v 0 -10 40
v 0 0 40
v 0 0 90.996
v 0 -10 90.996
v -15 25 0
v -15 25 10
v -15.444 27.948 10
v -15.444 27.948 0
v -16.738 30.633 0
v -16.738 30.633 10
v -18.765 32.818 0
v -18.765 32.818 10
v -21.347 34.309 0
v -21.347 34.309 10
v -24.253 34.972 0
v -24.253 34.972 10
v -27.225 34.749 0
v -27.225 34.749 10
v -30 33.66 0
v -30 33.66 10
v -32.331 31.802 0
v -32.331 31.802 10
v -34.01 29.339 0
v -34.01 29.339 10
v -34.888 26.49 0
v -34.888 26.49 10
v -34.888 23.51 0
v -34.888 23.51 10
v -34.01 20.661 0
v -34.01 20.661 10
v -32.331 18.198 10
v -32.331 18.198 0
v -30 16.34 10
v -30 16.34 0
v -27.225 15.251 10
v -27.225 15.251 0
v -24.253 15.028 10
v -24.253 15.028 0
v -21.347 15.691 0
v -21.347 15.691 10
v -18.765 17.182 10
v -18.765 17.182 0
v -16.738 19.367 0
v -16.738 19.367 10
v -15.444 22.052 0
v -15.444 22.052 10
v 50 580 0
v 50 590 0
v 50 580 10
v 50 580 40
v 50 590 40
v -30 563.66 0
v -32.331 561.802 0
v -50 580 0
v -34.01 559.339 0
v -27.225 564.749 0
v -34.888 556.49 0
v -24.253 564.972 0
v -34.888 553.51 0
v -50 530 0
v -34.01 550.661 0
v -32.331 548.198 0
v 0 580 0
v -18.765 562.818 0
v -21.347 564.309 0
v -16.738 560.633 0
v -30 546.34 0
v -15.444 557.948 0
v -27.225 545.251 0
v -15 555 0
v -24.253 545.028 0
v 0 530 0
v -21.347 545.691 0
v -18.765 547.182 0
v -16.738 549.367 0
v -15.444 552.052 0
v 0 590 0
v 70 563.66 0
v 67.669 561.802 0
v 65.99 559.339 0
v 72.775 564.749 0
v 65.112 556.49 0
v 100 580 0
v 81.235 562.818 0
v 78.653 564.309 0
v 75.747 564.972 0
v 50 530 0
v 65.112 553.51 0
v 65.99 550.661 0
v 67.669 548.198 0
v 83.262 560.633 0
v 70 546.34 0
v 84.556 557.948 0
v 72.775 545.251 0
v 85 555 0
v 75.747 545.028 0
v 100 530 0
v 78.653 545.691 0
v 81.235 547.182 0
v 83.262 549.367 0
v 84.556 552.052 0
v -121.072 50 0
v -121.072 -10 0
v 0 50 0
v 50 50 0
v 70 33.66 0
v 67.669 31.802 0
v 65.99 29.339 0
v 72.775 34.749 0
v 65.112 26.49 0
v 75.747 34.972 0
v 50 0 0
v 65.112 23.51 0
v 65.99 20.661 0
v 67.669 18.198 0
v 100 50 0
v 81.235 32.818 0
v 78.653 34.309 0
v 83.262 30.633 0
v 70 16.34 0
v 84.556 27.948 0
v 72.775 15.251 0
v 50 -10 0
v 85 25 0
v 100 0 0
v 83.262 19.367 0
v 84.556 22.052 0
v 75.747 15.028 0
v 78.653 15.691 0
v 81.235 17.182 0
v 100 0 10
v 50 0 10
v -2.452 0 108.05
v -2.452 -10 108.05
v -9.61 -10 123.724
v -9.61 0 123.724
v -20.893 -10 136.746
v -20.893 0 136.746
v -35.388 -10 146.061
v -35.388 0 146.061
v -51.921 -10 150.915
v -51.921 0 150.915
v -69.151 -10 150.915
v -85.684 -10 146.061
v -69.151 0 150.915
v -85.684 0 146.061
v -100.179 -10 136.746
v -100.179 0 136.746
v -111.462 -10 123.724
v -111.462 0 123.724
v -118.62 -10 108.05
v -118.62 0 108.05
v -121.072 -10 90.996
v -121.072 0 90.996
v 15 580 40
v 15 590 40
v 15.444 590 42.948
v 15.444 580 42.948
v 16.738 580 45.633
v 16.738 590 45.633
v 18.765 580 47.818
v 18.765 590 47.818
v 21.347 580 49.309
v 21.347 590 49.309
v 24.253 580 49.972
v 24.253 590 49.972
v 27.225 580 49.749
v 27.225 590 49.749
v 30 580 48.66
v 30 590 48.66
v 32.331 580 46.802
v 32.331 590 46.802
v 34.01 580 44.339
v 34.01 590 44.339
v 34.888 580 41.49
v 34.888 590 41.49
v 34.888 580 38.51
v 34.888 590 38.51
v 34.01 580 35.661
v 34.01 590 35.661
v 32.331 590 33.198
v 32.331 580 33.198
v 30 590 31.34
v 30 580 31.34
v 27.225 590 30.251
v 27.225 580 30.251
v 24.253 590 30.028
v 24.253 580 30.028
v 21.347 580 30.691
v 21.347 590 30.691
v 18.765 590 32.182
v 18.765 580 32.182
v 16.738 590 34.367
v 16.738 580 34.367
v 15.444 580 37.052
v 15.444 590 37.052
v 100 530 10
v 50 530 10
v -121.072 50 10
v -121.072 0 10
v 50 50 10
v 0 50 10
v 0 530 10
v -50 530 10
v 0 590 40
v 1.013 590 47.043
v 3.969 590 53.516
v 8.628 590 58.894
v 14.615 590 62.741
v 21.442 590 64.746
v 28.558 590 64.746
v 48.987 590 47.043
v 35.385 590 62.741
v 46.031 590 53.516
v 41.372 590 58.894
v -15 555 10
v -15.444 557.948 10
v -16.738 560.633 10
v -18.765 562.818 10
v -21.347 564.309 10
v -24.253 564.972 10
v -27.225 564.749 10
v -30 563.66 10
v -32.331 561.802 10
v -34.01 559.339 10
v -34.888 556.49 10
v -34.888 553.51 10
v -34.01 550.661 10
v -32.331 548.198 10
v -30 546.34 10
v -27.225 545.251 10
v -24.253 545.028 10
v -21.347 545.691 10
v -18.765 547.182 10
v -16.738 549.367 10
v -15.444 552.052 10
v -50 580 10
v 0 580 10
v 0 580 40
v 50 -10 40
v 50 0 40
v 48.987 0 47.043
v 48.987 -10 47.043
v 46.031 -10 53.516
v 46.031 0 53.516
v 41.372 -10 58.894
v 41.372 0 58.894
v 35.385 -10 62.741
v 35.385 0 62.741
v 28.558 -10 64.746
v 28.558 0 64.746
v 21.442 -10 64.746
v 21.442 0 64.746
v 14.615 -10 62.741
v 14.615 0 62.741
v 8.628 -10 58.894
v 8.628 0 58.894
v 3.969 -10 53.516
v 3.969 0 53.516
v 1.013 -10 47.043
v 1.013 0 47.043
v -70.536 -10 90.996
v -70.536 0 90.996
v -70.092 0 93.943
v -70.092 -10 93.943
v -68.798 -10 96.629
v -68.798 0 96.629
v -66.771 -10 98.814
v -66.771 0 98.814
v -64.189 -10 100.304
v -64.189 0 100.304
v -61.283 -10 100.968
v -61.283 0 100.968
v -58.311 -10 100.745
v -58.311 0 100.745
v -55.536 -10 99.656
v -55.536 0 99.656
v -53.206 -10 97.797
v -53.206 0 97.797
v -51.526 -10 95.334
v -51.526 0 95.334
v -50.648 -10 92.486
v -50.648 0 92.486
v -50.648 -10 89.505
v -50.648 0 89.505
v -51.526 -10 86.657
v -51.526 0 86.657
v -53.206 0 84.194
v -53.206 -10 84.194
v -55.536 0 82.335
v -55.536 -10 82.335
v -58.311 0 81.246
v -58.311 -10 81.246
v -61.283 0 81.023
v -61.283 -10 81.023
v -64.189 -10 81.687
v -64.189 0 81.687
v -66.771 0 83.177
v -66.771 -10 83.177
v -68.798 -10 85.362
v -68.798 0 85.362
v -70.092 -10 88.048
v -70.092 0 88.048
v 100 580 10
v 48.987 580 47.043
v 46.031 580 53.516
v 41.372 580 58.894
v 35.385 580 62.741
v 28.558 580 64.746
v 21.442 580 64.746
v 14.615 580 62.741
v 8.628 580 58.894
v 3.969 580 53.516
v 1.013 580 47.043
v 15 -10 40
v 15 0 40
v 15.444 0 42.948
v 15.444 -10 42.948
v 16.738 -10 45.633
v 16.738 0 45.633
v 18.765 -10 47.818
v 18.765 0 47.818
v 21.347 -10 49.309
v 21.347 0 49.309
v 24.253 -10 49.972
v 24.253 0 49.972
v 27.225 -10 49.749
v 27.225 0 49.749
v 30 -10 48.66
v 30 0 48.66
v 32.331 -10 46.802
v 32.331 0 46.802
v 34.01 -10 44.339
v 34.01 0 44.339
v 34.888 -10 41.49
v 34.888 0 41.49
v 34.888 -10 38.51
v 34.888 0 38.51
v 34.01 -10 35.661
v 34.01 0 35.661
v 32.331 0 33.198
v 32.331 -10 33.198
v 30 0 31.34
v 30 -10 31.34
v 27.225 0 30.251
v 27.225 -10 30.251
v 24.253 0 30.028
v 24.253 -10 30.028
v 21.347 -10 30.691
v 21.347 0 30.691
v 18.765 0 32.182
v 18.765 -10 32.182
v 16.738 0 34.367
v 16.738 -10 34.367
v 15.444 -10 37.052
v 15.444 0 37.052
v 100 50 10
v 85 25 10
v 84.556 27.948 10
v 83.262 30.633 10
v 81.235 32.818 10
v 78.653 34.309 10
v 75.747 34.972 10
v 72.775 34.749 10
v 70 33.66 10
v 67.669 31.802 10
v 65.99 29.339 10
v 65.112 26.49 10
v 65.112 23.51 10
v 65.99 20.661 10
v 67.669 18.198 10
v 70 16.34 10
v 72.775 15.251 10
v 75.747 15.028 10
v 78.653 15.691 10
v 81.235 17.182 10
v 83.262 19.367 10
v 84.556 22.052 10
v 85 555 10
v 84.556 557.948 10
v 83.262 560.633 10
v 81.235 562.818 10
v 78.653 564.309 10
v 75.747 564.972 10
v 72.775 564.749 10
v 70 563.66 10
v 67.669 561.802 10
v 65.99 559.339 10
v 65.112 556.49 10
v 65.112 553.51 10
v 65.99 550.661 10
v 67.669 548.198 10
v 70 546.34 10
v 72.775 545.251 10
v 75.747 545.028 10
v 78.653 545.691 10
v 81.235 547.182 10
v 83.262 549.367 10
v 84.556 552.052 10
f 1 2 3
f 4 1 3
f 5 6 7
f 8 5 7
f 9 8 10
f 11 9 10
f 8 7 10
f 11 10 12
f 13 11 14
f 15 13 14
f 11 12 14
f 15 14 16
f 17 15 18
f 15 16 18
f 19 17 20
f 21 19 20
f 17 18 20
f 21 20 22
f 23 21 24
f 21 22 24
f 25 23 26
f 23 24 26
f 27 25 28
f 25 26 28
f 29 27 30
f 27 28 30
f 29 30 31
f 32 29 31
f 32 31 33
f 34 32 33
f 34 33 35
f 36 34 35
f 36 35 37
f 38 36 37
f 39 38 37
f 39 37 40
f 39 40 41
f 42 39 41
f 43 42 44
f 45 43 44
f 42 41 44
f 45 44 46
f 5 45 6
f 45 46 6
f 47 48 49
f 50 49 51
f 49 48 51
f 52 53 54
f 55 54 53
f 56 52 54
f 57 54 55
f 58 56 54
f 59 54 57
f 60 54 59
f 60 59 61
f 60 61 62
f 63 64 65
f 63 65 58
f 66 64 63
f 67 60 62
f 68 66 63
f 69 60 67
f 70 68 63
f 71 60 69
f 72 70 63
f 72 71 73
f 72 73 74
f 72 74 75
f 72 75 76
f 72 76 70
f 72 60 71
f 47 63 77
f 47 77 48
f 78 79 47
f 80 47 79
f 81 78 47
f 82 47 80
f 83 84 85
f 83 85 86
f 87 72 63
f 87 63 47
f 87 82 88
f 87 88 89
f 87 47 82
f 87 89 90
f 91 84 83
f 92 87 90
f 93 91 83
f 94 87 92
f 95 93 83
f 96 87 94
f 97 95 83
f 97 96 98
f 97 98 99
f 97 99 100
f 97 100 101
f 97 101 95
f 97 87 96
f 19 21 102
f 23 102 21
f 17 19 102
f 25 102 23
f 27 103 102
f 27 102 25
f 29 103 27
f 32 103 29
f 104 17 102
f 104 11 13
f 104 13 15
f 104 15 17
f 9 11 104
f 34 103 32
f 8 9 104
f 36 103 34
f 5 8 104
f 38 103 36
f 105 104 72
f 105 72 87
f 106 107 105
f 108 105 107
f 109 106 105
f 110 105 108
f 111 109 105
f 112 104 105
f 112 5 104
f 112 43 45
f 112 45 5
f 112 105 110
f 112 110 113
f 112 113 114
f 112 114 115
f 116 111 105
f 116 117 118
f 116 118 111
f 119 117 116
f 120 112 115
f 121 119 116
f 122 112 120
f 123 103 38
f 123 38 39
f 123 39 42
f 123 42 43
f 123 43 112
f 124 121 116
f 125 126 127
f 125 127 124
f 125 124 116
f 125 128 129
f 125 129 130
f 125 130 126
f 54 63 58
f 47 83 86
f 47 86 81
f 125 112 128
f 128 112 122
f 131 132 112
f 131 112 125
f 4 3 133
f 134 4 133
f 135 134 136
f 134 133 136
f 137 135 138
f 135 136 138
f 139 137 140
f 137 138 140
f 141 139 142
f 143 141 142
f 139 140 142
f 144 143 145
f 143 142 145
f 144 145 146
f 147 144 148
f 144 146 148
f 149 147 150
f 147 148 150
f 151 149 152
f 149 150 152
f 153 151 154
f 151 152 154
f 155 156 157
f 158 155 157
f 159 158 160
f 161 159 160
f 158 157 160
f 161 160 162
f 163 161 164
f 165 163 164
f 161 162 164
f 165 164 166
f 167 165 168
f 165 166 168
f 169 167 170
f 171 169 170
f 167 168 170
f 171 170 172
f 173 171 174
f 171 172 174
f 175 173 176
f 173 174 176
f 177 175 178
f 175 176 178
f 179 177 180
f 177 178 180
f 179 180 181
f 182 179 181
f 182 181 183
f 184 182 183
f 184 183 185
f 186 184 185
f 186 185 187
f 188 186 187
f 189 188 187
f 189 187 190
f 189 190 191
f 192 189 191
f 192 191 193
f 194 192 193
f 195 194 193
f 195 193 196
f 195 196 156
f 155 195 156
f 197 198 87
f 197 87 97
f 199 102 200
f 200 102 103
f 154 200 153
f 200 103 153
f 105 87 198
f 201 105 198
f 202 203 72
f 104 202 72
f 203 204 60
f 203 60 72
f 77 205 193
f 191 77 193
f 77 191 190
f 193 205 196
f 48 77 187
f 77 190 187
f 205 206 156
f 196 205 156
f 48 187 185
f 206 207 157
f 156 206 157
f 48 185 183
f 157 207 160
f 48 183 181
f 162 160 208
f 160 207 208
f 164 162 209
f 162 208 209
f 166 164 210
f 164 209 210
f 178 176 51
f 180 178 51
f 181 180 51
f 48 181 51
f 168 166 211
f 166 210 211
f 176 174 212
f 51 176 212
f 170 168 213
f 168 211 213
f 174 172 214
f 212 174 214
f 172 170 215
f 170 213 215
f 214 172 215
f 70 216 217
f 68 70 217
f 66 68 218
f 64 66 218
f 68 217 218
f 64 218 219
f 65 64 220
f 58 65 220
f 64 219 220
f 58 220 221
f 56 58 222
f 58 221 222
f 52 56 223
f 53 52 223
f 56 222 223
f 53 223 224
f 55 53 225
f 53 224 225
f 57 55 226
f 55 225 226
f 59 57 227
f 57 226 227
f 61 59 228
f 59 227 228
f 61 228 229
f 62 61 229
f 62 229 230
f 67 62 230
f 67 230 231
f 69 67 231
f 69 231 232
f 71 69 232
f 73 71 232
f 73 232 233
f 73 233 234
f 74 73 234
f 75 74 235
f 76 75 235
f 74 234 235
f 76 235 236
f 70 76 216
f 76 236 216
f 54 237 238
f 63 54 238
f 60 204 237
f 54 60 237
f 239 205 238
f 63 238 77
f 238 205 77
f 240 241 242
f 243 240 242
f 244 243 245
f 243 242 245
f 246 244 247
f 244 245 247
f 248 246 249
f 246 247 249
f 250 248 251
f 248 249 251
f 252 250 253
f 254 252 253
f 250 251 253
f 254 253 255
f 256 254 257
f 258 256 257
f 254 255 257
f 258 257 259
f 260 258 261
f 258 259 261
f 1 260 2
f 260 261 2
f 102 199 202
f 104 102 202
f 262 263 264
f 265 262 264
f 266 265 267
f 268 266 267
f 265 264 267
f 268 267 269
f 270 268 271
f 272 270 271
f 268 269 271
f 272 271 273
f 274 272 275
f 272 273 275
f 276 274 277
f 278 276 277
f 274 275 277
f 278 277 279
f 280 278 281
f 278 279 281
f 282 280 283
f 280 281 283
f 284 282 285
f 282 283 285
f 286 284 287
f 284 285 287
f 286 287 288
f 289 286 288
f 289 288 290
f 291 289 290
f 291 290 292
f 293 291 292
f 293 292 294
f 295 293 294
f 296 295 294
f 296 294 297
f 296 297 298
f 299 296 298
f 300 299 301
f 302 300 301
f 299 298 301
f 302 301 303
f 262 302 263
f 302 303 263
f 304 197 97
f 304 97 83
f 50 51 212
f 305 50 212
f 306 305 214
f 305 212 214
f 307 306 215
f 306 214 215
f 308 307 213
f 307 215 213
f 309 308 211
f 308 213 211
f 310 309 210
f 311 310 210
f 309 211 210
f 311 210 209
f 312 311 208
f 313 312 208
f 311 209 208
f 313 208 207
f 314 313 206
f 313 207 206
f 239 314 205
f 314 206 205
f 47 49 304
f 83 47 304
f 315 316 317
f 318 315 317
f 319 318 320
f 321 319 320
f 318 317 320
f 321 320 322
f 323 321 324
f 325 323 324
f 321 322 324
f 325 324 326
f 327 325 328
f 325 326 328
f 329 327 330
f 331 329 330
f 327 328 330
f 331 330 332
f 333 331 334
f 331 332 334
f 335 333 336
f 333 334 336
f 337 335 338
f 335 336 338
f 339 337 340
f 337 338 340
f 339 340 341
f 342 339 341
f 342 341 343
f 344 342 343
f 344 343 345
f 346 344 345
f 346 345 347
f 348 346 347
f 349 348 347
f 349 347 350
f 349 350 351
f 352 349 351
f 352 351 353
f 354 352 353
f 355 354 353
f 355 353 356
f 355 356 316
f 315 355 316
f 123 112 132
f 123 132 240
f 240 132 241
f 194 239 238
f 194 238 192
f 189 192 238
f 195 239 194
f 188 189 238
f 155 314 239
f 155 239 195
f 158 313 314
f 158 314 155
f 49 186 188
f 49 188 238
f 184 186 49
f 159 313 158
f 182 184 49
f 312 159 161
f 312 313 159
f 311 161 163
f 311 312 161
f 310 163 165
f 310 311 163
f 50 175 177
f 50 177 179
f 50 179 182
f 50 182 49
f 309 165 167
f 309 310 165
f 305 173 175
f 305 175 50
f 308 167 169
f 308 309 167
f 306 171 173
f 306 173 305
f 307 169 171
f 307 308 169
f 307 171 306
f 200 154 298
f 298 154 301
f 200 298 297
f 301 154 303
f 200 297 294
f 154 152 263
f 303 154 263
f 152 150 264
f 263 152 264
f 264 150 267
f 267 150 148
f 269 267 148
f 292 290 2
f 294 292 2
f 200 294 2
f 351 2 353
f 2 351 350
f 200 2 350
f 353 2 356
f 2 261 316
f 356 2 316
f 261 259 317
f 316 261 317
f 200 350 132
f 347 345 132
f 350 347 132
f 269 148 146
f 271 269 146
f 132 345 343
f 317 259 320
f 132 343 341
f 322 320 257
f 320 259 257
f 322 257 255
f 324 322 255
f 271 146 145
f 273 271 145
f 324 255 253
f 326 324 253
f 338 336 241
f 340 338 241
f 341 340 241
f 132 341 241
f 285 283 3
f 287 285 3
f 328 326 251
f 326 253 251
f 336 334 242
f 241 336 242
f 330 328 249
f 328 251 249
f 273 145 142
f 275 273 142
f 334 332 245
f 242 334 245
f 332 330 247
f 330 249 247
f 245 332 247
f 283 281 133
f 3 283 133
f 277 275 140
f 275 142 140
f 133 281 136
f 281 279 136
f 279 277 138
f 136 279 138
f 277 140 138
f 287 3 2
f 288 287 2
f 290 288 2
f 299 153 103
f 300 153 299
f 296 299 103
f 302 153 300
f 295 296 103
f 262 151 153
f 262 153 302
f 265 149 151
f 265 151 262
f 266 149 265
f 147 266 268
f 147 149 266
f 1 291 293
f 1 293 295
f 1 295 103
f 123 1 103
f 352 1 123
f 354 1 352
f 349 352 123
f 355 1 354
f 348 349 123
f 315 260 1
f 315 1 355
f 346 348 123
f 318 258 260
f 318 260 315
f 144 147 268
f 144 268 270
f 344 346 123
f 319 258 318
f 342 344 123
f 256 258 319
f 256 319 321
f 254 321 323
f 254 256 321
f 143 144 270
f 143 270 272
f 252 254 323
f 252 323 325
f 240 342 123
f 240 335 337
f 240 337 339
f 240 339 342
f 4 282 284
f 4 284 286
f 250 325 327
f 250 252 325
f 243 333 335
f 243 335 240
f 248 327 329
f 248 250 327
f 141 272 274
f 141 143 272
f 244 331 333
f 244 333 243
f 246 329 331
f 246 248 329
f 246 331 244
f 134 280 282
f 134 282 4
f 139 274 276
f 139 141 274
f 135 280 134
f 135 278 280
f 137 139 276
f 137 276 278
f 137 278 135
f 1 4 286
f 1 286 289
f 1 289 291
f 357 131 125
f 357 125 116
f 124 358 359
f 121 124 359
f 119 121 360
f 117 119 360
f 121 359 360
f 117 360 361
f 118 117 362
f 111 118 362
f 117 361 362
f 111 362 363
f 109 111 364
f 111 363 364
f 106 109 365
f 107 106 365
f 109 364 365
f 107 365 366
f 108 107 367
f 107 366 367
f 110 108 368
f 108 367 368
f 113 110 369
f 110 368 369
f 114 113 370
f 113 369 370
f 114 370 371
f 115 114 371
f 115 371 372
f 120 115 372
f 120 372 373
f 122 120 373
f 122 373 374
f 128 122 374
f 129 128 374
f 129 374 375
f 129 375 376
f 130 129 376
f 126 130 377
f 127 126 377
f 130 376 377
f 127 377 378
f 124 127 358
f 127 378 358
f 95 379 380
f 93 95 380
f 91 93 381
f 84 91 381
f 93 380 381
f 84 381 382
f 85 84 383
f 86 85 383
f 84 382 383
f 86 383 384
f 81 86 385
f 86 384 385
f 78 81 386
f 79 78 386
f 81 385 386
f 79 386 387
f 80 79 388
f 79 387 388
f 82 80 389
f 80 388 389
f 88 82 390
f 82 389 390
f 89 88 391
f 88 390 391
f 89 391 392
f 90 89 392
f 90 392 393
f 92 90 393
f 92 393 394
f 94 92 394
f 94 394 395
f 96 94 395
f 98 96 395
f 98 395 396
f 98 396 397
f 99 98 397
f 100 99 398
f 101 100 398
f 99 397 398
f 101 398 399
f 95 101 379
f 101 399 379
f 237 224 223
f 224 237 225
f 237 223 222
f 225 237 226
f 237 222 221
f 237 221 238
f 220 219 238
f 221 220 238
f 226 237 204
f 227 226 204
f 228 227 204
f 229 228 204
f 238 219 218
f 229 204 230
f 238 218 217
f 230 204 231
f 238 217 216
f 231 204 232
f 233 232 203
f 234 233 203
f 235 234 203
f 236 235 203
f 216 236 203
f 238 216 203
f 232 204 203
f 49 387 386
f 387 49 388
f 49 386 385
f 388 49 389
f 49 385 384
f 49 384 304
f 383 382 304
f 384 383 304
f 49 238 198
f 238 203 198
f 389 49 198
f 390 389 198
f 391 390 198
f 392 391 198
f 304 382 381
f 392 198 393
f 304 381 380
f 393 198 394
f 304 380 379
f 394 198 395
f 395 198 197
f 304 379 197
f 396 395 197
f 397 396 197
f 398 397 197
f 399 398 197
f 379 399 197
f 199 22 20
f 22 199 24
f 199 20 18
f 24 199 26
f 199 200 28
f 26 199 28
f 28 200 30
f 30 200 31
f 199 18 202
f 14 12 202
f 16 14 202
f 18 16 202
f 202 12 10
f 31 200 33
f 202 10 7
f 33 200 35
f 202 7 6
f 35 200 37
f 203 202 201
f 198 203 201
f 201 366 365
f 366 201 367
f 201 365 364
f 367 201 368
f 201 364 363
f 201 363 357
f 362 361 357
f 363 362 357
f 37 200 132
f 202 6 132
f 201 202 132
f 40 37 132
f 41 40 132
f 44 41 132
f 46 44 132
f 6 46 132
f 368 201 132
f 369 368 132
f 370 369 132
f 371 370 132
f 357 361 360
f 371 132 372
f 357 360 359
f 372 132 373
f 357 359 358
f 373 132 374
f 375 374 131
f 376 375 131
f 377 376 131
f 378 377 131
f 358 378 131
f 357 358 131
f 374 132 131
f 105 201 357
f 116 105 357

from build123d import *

# Parameters (mm, degrees)
F1_DEPTH  = 10
F2_R      = 10
F3_DEPTH  = 25
F4_W      = 50
F4_H      = 10
F5_DEPTH  = 580
F7_R      = 10
F8_DEPTH  = 40
F12_W     = 50
F12_H     = 50
F12_R     = 10
F13_DEPTH = 10
F14_W     = 50
F14_H     = 10
F14_W_2   = 71.0721209645
F15_DEPTH = 10
F16_DEPTH = 50


with BuildPart() as f1:
    # F0 (on Front) → F1 (new body)
    with BuildSketch(Plane.XZ):
        with BuildLine():
            Line((0, 40), (0, 0))
            Line((0, 0), (50, 0))
            Line((50, 0), (50, 40))
            ThreePointArc((50, 40), (25, 65), (0, 40))
        make_face()
    extrude(amount=F1_DEPTH)

    # F2 (on face) → F3 (cut)
    with BuildSketch(Plane(origin=(0, 0, 0), x_dir=(-1, 0, 0), z_dir=(0, 1, 0))):
        with Locations((-25, 40)):
            Circle(F2_R)
    extrude(amount=-F3_DEPTH, mode=Mode.SUBTRACT)


with BuildPart() as f5:
    # F4 (on face) → F5 (new body)
    with BuildSketch(Plane(origin=(0, 0, 0), x_dir=(-1, 0, 0), z_dir=(0, 1, 0))):
        with Locations((-25, 5)):
            Rectangle(F4_W, F4_H)
    extrude(amount=F5_DEPTH)


with BuildPart() as f6_1:
    # F6: copy of F1
    add(f1.part.moved(Location((0, 590, 0))))


with BuildPart() as f8:
    # F7 (on face) → F8 (new body)
    with BuildSketch(Plane.XZ.offset(10)):
        with Locations((25, 0)):
            Circle(F7_R)
    extrude(amount=-F8_DEPTH)


with BuildPart() as f9_1:
    # F9: copy of F8
    add(f8.part.moved(Location((0, 560, 0))))


with BuildPart() as f1_1:
    add(f1.part)

    add(f5.part)  # F13 merges F5

    add(f6_1.part)  # F13 merges F6_1
    # F12 (on face) → F13 (join)
    with BuildSketch(Plane.XY.offset(10)):
        with Locations((-25, 25)):
            Rectangle(F12_W, F12_H)
        with Locations((-25, 25)):
            Circle(F12_R, mode=Mode.SUBTRACT)
        with Locations((-25, 555)):
            Rectangle(F12_W, F12_H)
        with Locations((-25, 555)):
            Circle(F12_R, mode=Mode.SUBTRACT)
        with Locations((75, 25)):
            Rectangle(F12_W, F12_H)
        with Locations((75, 25)):
            Circle(F12_R, mode=Mode.SUBTRACT)
        with Locations((75, 555)):
            Rectangle(F12_W, F12_H)
        with Locations((75, 555)):
            Circle(F12_R, mode=Mode.SUBTRACT)
    extrude(amount=-F13_DEPTH)

    # F14 (on face) → F15 (join)
    with BuildSketch(Plane.XZ):
        with Locations((-25, 5)):
            Rectangle(F14_W, F14_H)
        with Locations((-85.5360604823, 5)):
            Rectangle(F14_W_2, F14_H)
        with BuildLine():
            Line((-121.0721209645, 10), (-50, 10))
            Line((-50, 10), (0, 10))
            Line((0, 10), (0, 90.9955129027))
            ThreePointArc((0, 90.9955129027), (-60.5360604823, 30.4594524205), (-121.0721209645, 90.9955129027))
            Line((-121.0721209645, 90.9955129027), (-121.0721209645, 10))
        make_face()
        with BuildLine():
            ThreePointArc((0, 90.9955129027), (-60.5360604823, 151.531573385), (-121.0721209645, 90.9955129027))
            Line((-121.0721209645, 90.9955129027), (-70.5360604823, 90.9955129027))
            ThreePointArc((-70.5360604823, 90.9955129027), (-60.5360604823, 100.9955129027), (-50.5360604823, 90.9955129027))
            Line((-50.5360604823, 90.9955129027), (0, 90.9955129027))
        make_face()
        with BuildLine():
            Line((-70.5360604823, 90.9955129027), (-121.0721209645, 90.9955129027))
            ThreePointArc((-121.0721209645, 90.9955129027), (-60.5360604823, 30.4594524205), (0, 90.9955129027))
            Line((0, 90.9955129027), (-50.5360604823, 90.9955129027))
            ThreePointArc((-50.5360604823, 90.9955129027), (-60.5360604823, 80.9955129027), (-70.5360604823, 90.9955129027))
        make_face()
    extrude(amount=F15_DEPTH)

    # F14 (on face) → F16 (join)
    with BuildSketch(Plane.XZ):
        with Locations((-85.5360604823, 5)):
            Rectangle(F14_W_2, F14_H)
    extrude(amount=-F16_DEPTH)


solid = f1_1.part
